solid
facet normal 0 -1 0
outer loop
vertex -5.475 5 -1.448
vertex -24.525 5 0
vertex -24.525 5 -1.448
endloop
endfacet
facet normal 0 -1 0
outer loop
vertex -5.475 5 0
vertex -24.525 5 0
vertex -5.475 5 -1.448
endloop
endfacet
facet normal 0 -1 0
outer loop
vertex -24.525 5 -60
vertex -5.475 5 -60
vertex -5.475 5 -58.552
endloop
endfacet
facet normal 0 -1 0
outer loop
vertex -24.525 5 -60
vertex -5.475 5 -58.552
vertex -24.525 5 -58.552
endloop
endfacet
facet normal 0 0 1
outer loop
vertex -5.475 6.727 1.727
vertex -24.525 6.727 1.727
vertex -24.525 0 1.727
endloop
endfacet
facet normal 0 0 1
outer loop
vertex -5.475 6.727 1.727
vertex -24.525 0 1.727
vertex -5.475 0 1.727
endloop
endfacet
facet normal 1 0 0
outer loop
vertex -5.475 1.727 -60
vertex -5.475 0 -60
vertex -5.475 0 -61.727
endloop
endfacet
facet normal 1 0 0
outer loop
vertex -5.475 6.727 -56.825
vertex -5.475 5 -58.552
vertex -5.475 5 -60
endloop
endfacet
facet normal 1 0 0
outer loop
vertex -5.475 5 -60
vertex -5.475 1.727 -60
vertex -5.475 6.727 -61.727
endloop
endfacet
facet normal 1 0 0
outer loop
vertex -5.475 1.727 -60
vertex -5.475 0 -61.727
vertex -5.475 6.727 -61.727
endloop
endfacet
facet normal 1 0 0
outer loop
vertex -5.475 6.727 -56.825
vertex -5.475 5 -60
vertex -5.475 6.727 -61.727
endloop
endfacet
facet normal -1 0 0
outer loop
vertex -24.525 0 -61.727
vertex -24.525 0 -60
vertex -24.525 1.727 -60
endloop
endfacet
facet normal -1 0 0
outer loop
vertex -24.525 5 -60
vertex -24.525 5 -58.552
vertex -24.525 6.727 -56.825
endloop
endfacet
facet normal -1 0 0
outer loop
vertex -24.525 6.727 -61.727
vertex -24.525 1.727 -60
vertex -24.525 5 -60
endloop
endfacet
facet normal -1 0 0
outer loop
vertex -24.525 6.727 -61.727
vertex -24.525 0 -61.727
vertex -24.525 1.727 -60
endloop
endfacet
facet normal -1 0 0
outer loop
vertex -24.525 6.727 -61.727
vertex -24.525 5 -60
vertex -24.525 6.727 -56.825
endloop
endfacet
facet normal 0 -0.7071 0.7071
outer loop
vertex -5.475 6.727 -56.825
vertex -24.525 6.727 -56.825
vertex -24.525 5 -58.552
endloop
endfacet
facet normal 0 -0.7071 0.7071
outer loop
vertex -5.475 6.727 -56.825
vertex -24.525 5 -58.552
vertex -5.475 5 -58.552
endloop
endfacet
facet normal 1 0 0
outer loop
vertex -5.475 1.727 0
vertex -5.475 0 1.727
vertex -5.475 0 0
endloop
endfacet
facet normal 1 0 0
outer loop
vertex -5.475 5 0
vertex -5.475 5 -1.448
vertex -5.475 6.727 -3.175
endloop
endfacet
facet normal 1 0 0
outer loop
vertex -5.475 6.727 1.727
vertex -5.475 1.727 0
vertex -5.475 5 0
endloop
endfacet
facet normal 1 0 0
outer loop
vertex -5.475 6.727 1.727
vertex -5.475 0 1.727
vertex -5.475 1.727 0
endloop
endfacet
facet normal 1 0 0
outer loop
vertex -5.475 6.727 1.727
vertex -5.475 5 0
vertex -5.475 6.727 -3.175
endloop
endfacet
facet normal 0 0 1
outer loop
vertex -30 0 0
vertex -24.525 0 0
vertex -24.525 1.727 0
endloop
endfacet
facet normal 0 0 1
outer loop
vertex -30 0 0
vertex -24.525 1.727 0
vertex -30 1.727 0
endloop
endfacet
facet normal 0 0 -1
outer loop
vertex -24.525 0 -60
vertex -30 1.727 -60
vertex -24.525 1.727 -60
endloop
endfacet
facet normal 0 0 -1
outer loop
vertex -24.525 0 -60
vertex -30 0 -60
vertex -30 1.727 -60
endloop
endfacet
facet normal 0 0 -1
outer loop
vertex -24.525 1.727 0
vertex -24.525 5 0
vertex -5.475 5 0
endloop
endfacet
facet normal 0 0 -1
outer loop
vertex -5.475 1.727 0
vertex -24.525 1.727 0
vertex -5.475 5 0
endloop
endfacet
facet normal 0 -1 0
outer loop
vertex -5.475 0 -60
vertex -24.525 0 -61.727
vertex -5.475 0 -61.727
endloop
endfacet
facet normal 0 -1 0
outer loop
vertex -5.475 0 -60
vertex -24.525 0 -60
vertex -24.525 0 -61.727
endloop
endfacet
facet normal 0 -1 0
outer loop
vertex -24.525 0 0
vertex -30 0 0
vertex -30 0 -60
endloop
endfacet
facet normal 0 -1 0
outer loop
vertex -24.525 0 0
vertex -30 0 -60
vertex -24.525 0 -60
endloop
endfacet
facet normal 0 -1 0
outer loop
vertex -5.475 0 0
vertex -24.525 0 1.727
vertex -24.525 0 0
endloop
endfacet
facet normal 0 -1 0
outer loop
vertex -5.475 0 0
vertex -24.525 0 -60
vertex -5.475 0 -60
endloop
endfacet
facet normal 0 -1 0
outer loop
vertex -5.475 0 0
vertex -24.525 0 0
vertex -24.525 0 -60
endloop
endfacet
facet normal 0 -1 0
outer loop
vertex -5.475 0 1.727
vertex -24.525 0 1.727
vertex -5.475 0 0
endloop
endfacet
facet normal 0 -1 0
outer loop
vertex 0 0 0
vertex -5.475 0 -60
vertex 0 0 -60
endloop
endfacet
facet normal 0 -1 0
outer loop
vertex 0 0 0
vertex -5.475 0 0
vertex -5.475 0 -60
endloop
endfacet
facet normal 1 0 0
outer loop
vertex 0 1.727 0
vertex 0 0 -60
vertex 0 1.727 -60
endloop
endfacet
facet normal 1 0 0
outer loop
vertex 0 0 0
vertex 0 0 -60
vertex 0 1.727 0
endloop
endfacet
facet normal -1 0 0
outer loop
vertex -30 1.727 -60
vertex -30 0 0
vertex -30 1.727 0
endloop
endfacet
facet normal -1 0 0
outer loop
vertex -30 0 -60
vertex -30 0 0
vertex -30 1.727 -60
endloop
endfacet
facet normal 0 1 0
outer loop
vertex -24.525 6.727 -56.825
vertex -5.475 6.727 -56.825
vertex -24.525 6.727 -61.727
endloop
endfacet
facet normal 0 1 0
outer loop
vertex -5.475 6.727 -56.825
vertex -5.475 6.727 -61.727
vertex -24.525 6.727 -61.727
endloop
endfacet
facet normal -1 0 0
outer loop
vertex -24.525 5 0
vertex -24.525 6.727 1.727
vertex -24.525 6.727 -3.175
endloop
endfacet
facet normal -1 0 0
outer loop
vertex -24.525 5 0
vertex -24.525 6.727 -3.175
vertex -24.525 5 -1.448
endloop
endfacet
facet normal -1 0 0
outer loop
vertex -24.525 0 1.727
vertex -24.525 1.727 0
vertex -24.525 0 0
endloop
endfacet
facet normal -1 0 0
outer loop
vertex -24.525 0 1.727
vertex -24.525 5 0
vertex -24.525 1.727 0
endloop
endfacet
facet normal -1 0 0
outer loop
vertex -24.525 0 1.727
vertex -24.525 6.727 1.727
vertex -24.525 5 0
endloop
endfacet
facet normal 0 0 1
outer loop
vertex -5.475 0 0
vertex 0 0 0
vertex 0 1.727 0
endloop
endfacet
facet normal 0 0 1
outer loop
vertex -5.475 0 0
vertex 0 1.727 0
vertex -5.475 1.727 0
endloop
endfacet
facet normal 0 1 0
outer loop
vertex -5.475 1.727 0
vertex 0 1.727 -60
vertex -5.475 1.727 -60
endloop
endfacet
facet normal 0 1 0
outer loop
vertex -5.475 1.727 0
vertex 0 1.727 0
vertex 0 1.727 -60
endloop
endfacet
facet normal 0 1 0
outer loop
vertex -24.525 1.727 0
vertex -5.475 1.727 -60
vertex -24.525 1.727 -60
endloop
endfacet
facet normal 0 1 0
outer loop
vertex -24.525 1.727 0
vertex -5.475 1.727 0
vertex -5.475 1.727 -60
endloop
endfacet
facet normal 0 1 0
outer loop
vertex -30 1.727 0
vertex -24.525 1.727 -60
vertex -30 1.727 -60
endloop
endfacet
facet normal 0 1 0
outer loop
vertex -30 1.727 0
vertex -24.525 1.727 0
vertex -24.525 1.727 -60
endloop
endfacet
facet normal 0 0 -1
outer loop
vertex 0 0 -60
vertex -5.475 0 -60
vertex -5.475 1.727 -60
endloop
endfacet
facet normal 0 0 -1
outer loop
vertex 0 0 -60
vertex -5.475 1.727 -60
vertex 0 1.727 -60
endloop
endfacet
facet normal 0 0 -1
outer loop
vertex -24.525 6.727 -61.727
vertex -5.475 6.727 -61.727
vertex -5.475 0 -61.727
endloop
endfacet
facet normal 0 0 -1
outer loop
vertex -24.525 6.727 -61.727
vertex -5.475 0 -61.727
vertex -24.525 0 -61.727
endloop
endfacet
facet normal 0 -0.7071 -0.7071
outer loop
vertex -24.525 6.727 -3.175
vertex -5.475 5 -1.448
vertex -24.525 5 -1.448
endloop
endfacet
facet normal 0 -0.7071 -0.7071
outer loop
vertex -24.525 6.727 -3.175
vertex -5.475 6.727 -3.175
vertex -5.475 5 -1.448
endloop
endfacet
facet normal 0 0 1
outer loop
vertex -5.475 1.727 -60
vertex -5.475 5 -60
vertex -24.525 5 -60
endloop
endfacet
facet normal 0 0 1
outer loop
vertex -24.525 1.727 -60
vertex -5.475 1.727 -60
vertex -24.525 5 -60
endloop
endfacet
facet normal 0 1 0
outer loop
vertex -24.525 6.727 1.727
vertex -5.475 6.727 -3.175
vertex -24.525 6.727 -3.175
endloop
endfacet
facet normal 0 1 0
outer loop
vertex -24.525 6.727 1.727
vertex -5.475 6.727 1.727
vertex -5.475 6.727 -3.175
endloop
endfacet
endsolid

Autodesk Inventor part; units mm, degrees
ref_plane "YZ Plane" through (0, 0, 0) normal (1, 0, 0) x (0, 1, 0)
ref_plane "XZ Plane" through (0, 0, 0) normal (0, 1, 0) x (-1, 0, 0)
ref_plane "XY Plane" through (0, 0, 0) normal (0, 0, 1) x (1, 0, 0)
sketch "Sketch1" plane through (0, 0, 0) normal (0, 1, 0) x (-1, 0, 0)
  line L0 (0, 0) -> (30, 0)
  line L1 (30, 0) -> (30, -60)
  line L2 (30, -60) -> (0, -60)
  line L3 (0, -60) -> (0, 0)
  dimension "d0" = 30
  dimension "d1" = 60
extrude "Extrusion1" add sketch "Sketch1" along normal blind 1.7272
sketch "Sketch2" plane through (-30, 0, 0) normal (0, 0, 1) x (1, 0, 0)
  line L0 (30, 0) -> (0, 0) projected
  line L1 (5.475, 0) -> (24.525, 0)
  line L2 (24.525, 0) -> (24.525, 6.7272)
  line L3 (24.525, 6.7272) -> (5.475, 6.7272)
  line L4 (5.475, 6.7272) -> (5.475, 0)
  point P0 (15, 6.7272)
  point P1 (15, 0)
  dimension "d4" = 19.05
  dimension "d5" = 6.7272
extrude "Extrusion2" add sketch "Sketch2" along normal blind 1.7272
sketch "Sketch3" plane through (-30, 0, 0) normal (0, 0, -1) x (-1, 0, 0)
  line L0 (-24.525, 6.7272) -> (-5.475, 6.7272) projected
  line L1 (-5.475, 6.7272) -> (-5.475, 1.7272) projected
  line L2 (-24.525, 6.7272) -> (-5.475, 6.7272)
  line L3 (-5.475, 6.7272) -> (-5.475, 5)
  line L4 (-5.475, 5) -> (-24.525, 5)
  line L5 (-24.525, 5) -> (-24.525, 6.7272)
  point P0 (-30, 0)
  dimension "d8" = 1.7272
extrude "Extrusion3" add sketch "Sketch3" along normal blind 3.175
sketch "Sketch4" plane through (0, 0, -60) normal (0, 0, -1) x (-1, 0, 0)
  line L0 (30, 0) -> (0, 0) projected
  line L1 (5.475, 6.7272) -> (24.525, 6.7272)
  line L2 (24.525, 6.7272) -> (24.525, 0)
  line L3 (24.525, 0) -> (5.475, 0)
  line L4 (5.475, 0) -> (5.475, 6.7272)
  line L5 (24.525, 6.7272) -> (5.475, 6.7272) projected
  point P0 (15, 6.7272)
  point P1 (15, 6.7272)
  dimension "d11" = 19.05
  dimension "d12" = 6.7272
extrude "Extrusion4" add sketch "Sketch4" along normal blind 1.7272
sketch "Sketch5" plane through (0, 0, -60) normal (0, 0, 1) x (1, 0, 0)
  line L0 (-5.475, 6.7272) -> (-24.525, 6.7272) projected
  line L1 (-5.475, 1.7272) -> (-5.475, 6.7272) projected
  line L2 (-24.525, 6.7272) -> (-5.475, 6.7272)
  line L3 (-5.475, 6.7272) -> (-5.475, 5)
  line L4 (-5.475, 5) -> (-24.525, 5)
  line L5 (-24.525, 5) -> (-24.525, 6.7272)
  point P0 (0, 0)
  dimension "d15" = 1.7272
extrude "Extrusion5" add sketch "Sketch5" along normal blind 3.175
chamfer "Chamfer1" distance 1.7272 angle 45 2 edges at (-15, 5, -3.175) (-15, 5, -56.825)
properties part number "PanelHolder"
